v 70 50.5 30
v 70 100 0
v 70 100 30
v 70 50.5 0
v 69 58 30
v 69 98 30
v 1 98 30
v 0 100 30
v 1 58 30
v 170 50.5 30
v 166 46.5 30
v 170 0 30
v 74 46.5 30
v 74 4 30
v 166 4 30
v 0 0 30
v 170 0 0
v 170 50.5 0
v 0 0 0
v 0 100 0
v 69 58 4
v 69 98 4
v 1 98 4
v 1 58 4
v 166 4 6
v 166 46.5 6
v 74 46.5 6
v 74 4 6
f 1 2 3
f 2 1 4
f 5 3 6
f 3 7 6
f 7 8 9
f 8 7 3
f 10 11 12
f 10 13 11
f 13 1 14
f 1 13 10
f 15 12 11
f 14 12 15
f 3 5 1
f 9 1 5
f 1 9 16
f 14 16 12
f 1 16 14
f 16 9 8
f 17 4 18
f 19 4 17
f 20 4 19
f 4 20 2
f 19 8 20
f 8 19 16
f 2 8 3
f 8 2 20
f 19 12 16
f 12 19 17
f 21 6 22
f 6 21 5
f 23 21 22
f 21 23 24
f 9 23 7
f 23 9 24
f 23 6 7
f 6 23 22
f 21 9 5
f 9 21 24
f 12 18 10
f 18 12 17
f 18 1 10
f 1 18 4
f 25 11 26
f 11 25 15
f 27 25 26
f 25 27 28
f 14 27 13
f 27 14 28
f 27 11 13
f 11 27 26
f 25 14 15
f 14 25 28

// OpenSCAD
$fn=48;
translate([0,0,0])
{
difference()
{
    cube(size = [70.00, 100.00, 30.00], center = false); 
    translate(v = [1.00, 58.00, 4.00])
    {
        cube(size = [68.00, 40.00, 26.00], center = false); 
    }
}

}
translate([70,0,0])
{
difference()
{
    cube(size = [100.00, 50.50, 30.00], center = false); 
    translate(v = [4.00, 4.00, 6.00])
    {
        cube(size = [92.00, 42.50, 24.00], center = false); 
    }
}

}
